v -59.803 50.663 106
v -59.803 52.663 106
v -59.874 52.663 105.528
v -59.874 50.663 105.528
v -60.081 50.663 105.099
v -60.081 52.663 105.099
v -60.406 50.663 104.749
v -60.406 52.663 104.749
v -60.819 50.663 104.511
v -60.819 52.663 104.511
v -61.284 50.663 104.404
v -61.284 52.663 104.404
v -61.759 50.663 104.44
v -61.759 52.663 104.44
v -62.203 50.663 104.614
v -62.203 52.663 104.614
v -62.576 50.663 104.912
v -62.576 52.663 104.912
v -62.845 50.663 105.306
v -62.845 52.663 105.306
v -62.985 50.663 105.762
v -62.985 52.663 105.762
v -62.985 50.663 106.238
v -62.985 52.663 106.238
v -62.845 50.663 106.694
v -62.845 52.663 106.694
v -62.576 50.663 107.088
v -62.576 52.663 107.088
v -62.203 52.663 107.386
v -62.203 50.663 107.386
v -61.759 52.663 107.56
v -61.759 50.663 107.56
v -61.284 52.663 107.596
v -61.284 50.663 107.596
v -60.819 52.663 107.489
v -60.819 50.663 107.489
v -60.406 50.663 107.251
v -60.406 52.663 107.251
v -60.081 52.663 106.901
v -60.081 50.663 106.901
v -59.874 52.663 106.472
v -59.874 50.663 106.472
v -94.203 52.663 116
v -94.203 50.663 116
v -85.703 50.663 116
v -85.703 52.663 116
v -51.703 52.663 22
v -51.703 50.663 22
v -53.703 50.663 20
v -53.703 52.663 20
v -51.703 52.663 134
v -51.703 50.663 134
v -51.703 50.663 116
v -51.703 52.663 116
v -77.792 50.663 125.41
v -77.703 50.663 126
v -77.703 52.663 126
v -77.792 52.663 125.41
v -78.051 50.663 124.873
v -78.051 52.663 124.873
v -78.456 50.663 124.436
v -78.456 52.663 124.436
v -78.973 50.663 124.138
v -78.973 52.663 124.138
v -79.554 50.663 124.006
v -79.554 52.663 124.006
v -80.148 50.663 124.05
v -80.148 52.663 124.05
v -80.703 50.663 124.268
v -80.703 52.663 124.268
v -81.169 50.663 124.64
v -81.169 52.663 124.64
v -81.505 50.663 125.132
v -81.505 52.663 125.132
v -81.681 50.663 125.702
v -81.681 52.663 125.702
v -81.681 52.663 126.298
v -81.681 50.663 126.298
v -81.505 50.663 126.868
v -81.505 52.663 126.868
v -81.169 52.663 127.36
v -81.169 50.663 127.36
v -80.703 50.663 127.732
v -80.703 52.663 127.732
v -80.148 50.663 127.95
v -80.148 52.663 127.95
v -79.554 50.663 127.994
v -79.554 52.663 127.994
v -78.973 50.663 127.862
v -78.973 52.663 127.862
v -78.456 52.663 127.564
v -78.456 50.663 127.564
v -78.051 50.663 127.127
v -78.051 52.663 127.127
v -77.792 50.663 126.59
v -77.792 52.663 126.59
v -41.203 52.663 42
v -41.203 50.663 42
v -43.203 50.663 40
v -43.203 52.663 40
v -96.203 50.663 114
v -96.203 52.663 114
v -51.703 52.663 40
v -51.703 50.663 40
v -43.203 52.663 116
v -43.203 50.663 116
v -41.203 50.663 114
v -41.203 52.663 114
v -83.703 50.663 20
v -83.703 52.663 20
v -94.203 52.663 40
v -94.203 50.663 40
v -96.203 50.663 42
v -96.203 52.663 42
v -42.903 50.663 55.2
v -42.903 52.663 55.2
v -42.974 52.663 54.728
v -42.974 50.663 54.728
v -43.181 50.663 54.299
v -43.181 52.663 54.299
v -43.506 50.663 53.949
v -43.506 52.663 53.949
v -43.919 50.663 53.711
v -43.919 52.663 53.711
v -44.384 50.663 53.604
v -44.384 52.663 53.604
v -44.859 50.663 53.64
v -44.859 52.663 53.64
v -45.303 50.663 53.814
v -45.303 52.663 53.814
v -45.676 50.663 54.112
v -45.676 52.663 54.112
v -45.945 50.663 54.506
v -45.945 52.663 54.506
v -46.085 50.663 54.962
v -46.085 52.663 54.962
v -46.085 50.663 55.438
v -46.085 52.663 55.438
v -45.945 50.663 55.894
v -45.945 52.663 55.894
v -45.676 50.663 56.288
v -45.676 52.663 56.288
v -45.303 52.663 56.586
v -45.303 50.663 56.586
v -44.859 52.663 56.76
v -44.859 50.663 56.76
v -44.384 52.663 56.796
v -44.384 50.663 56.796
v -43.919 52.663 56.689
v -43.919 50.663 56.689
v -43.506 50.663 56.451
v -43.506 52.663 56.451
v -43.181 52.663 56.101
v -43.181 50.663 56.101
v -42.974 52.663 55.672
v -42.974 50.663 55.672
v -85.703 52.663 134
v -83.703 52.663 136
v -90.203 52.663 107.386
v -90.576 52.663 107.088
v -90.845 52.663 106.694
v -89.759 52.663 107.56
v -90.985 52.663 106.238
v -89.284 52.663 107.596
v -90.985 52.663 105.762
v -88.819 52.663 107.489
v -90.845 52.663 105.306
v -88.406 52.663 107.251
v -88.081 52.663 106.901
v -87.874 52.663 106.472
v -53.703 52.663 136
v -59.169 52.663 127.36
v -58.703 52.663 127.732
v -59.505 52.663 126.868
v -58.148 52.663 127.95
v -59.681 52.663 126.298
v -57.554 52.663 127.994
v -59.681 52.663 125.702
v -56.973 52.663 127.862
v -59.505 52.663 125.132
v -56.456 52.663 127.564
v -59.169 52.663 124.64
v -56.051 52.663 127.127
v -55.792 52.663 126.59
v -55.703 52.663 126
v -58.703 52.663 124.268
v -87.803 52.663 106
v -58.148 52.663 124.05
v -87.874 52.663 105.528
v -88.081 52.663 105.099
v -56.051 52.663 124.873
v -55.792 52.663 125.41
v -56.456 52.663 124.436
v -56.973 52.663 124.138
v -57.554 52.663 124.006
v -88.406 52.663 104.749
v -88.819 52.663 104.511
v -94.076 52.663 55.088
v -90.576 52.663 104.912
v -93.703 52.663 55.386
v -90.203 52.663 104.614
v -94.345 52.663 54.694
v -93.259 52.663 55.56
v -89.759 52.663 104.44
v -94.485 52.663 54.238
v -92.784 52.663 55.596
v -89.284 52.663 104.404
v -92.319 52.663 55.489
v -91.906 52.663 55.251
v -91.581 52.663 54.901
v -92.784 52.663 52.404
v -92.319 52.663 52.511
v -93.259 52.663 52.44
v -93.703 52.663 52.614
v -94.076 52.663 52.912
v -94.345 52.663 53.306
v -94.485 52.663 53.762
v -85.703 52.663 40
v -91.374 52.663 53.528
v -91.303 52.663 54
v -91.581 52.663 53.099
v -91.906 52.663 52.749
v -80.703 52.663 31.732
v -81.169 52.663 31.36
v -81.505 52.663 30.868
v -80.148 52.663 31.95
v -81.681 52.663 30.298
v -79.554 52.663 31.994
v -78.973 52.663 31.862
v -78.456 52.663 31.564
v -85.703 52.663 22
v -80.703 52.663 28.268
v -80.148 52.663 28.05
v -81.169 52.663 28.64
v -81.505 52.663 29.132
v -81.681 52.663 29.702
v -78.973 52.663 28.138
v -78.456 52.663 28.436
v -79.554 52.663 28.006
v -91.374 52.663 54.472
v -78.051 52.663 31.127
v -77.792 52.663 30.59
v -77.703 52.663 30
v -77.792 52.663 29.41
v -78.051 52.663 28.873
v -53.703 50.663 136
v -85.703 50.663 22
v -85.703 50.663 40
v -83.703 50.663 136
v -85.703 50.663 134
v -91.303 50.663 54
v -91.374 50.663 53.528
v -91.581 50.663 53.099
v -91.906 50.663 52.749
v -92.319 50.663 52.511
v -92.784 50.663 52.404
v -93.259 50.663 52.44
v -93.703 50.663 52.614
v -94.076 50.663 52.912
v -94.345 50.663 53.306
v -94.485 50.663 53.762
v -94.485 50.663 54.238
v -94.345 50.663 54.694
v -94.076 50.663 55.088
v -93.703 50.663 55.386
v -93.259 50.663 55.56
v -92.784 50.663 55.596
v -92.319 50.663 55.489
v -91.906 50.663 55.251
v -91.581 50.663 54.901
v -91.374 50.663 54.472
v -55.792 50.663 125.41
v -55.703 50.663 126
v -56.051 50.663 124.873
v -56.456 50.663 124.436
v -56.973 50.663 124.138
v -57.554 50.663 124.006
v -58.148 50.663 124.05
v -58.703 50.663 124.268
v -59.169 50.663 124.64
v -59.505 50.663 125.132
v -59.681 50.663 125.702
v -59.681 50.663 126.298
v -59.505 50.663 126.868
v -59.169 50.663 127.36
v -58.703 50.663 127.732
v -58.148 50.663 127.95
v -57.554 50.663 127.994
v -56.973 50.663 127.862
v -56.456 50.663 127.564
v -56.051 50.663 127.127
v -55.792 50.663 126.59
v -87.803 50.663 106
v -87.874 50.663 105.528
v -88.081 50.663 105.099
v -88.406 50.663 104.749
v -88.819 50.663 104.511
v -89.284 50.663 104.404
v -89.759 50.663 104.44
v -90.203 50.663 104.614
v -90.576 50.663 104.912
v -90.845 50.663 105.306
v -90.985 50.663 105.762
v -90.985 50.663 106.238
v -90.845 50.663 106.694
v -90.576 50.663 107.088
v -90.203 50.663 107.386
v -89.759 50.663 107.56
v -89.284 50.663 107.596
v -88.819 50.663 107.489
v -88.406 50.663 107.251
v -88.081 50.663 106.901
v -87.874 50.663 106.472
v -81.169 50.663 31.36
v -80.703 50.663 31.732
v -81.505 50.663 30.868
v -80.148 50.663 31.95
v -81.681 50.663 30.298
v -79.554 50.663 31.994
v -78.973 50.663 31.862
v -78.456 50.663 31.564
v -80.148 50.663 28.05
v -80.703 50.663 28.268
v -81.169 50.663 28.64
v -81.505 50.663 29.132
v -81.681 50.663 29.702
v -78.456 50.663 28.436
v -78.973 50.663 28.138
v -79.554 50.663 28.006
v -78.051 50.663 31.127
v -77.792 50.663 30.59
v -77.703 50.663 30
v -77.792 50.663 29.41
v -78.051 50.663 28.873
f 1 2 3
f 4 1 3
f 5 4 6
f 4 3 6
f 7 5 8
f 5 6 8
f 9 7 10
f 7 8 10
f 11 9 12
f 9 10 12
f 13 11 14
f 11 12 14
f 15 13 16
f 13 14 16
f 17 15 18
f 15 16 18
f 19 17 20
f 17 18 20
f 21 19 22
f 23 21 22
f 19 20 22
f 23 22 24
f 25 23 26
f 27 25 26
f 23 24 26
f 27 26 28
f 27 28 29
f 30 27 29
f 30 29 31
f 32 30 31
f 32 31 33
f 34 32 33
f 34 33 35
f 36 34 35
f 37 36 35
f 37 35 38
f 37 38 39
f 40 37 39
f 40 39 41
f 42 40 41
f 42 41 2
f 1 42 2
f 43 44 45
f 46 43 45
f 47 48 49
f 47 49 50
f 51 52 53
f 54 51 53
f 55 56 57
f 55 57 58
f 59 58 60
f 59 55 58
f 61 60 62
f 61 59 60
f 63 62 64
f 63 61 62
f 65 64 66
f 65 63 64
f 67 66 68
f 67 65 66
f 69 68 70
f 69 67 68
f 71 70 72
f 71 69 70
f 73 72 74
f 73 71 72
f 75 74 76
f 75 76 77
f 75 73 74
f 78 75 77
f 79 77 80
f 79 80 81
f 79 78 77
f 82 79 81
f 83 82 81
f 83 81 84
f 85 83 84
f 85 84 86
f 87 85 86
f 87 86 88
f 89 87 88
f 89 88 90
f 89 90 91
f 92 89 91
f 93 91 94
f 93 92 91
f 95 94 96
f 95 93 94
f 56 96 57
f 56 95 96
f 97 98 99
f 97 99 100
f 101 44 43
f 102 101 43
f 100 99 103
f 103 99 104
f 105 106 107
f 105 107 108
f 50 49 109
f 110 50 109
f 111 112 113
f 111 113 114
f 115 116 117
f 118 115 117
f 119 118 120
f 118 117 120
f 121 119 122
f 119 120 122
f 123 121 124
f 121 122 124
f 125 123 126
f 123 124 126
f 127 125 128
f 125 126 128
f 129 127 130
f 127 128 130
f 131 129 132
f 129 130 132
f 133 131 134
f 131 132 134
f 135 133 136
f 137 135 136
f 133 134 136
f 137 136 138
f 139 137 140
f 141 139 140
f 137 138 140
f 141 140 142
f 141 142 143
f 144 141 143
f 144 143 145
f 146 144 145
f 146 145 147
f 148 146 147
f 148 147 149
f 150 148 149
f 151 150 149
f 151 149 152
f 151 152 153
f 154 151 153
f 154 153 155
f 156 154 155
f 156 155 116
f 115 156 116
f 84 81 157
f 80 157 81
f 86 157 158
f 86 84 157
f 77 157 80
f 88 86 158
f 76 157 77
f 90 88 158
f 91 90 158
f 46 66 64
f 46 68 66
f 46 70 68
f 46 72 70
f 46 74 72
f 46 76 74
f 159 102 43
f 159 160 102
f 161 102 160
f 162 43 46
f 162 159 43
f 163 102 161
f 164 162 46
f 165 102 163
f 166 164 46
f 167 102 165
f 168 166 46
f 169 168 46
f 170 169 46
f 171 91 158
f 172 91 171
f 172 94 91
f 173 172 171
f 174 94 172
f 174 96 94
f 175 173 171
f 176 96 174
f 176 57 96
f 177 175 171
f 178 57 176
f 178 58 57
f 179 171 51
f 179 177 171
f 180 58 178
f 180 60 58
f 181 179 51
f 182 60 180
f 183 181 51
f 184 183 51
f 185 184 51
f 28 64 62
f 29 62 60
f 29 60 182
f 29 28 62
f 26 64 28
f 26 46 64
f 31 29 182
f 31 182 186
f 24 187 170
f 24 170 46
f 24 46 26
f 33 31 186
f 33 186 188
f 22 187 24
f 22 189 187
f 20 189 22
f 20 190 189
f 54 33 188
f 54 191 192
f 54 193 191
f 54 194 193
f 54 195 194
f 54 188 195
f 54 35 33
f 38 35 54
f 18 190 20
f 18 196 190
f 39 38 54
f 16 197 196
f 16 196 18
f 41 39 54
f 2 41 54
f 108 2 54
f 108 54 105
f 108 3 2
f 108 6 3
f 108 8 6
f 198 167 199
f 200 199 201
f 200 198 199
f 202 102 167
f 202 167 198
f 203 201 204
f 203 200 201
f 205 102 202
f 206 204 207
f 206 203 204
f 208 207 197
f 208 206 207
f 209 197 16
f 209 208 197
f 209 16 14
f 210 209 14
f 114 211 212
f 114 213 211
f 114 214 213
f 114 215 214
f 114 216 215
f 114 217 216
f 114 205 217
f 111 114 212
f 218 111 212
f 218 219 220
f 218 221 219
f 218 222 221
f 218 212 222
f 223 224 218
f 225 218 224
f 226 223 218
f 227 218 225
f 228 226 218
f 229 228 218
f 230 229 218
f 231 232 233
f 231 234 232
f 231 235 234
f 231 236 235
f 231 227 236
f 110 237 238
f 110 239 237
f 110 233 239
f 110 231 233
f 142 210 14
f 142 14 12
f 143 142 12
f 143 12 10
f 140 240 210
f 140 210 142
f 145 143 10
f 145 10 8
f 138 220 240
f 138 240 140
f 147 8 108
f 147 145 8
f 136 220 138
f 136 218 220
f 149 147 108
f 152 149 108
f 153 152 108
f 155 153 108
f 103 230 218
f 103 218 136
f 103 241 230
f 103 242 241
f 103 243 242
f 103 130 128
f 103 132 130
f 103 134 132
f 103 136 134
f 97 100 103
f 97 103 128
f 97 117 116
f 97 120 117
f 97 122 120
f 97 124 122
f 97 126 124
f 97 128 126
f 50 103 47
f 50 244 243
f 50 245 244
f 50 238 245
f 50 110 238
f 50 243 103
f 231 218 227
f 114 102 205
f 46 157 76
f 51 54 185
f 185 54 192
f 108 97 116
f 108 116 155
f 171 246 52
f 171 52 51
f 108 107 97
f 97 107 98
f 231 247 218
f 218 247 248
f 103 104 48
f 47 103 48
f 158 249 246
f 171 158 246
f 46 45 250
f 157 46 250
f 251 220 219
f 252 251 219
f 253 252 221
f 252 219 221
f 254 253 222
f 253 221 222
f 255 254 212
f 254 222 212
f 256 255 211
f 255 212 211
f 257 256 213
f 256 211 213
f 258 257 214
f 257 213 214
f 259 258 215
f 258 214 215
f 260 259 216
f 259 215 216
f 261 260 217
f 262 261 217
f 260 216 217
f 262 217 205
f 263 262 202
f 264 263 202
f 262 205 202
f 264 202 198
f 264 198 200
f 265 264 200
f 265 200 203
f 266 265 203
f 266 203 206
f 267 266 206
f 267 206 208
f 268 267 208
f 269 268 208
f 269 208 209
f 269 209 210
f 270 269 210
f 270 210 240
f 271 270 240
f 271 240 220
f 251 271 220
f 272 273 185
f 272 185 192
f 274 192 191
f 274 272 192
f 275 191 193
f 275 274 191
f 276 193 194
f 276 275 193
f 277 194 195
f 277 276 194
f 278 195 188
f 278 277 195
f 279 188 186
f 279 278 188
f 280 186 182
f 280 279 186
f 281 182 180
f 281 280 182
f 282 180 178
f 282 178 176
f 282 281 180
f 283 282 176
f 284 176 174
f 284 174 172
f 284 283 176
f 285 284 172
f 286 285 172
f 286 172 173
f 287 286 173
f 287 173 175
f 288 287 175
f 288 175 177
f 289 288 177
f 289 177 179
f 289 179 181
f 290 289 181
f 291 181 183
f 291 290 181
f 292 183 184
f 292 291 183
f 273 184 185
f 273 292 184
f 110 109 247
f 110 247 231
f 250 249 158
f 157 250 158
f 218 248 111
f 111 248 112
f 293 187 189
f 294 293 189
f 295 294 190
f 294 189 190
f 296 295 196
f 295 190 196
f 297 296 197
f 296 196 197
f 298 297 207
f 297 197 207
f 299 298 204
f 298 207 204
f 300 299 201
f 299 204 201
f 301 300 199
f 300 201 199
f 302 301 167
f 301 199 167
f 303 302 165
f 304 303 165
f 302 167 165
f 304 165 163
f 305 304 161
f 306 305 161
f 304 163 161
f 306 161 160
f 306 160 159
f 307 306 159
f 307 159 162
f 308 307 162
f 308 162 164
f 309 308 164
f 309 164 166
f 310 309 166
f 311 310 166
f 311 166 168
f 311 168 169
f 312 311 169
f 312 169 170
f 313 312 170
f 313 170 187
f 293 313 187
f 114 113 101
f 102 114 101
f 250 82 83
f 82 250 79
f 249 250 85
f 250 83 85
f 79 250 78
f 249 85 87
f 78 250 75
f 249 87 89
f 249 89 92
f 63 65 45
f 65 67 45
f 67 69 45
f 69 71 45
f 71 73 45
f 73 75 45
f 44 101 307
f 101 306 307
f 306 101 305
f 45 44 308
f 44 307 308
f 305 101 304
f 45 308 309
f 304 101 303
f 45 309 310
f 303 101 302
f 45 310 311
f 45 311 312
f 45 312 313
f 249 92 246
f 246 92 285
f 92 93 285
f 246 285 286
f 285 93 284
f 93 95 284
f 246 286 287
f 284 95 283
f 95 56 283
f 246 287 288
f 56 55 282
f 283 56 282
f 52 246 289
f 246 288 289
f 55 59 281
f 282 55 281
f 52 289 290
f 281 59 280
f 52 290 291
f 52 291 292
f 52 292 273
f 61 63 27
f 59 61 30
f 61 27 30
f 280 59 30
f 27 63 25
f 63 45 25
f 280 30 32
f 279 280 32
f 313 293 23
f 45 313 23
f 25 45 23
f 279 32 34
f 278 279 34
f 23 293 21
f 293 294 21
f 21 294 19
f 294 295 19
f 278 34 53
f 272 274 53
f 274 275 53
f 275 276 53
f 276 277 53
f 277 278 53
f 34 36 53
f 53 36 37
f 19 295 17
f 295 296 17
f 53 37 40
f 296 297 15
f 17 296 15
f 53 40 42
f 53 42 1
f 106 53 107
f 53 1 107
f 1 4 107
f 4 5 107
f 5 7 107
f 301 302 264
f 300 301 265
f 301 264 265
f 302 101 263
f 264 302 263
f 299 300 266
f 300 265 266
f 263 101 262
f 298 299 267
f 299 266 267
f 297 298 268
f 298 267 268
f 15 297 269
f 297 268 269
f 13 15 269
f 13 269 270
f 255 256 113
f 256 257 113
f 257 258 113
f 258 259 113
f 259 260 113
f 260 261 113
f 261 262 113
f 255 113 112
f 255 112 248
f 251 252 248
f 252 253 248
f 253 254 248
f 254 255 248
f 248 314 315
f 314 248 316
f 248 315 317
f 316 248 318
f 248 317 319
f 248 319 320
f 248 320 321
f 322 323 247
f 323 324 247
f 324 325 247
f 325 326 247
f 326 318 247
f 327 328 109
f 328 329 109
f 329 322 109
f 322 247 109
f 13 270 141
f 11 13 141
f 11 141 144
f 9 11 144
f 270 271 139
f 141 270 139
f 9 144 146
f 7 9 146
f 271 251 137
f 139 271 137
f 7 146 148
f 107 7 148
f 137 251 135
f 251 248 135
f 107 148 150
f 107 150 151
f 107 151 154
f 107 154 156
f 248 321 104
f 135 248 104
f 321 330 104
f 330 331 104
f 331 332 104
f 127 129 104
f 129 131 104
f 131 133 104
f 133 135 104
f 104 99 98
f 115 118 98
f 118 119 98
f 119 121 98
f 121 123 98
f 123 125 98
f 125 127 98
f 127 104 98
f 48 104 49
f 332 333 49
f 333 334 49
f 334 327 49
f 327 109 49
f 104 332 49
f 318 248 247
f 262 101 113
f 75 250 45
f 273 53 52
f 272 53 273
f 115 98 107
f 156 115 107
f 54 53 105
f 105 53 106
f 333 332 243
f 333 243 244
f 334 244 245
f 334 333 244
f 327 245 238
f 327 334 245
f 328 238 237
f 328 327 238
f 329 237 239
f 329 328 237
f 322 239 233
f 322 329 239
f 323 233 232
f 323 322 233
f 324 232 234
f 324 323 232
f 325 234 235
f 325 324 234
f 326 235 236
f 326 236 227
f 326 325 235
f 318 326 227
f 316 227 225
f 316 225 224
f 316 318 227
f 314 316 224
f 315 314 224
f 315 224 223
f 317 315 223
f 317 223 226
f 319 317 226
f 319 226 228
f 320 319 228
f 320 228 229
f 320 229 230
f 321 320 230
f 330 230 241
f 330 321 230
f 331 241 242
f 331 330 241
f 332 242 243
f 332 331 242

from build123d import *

# Parameters (mm, degrees)
SKETCH1_R           = 2
BOSS_EXTRUDE1_DEPTH = 2
SKETCH2_R           = 1.6
CUT_EXTRUDE1_DEPTH  = 10
CHAMFER1_SIZE       = 2


with BuildPart() as part:
    # Sketch1 → Boss-Extrude1 (new body)
    with BuildSketch(Plane(origin=(0, 50.662802213, 0), x_dir=(1, 0, 0), z_dir=(0, 1, 0))):
        Polygon((-85.703232371, -20), (-85.703232371, -40), (-96.203232371, -40), (-96.203232371, -116), (-85.703232371, -116), (-85.703232371, -136), (-51.703232371, -136), (-51.703232371, -116), (-41.203232371, -116), (-41.203232371, -40), (-51.703232371, -40), (-51.703232371, -20), align=None)
        with Locations((-79.703232371, -30)):
            Circle(SKETCH1_R, mode=Mode.SUBTRACT)
        with Locations((-79.703232371, -126)):
            Circle(SKETCH1_R, mode=Mode.SUBTRACT)
        with Locations((-57.703232371, -126)):
            Circle(SKETCH1_R, mode=Mode.SUBTRACT)
    extrude(amount=BOSS_EXTRUDE1_DEPTH)

    # Sketch2 → Cut-Extrude1 (cut)
    with BuildSketch(Plane(origin=(0, 52.662802213, 0), x_dir=(1, 0, 0), z_dir=(0, 1, 0))):
        with Locations((-92.903232371, -54)):
            Circle(SKETCH2_R)
        with Locations((-44.503232371, -55.2)):
            Circle(SKETCH2_R)
        with Locations((-89.403232371, -106)):
            Circle(SKETCH2_R)
        with Locations((-61.403232371, -106)):
            Circle(SKETCH2_R)
    extrude(amount=-CUT_EXTRUDE1_DEPTH, mode=Mode.SUBTRACT)

    # Chamfer1
    chamfer1_edges = [part.edges().sort_by_distance(p)[0] for p in [
        (-51.703232371, 51.662802213, 20),
        (-41.203232371, 51.662802213, 40),
        (-41.203232371, 51.662802213, 116),
        (-51.703232371, 51.662802213, 136),
        (-85.703232371, 51.662802213, 136),
        (-96.203232371, 51.662802213, 116),
        (-96.203232371, 51.662802213, 40),
        (-85.703232371, 51.662802213, 20),
    ]]
    chamfer(chamfer1_edges, length=CHAMFER1_SIZE)


solid = part.part
